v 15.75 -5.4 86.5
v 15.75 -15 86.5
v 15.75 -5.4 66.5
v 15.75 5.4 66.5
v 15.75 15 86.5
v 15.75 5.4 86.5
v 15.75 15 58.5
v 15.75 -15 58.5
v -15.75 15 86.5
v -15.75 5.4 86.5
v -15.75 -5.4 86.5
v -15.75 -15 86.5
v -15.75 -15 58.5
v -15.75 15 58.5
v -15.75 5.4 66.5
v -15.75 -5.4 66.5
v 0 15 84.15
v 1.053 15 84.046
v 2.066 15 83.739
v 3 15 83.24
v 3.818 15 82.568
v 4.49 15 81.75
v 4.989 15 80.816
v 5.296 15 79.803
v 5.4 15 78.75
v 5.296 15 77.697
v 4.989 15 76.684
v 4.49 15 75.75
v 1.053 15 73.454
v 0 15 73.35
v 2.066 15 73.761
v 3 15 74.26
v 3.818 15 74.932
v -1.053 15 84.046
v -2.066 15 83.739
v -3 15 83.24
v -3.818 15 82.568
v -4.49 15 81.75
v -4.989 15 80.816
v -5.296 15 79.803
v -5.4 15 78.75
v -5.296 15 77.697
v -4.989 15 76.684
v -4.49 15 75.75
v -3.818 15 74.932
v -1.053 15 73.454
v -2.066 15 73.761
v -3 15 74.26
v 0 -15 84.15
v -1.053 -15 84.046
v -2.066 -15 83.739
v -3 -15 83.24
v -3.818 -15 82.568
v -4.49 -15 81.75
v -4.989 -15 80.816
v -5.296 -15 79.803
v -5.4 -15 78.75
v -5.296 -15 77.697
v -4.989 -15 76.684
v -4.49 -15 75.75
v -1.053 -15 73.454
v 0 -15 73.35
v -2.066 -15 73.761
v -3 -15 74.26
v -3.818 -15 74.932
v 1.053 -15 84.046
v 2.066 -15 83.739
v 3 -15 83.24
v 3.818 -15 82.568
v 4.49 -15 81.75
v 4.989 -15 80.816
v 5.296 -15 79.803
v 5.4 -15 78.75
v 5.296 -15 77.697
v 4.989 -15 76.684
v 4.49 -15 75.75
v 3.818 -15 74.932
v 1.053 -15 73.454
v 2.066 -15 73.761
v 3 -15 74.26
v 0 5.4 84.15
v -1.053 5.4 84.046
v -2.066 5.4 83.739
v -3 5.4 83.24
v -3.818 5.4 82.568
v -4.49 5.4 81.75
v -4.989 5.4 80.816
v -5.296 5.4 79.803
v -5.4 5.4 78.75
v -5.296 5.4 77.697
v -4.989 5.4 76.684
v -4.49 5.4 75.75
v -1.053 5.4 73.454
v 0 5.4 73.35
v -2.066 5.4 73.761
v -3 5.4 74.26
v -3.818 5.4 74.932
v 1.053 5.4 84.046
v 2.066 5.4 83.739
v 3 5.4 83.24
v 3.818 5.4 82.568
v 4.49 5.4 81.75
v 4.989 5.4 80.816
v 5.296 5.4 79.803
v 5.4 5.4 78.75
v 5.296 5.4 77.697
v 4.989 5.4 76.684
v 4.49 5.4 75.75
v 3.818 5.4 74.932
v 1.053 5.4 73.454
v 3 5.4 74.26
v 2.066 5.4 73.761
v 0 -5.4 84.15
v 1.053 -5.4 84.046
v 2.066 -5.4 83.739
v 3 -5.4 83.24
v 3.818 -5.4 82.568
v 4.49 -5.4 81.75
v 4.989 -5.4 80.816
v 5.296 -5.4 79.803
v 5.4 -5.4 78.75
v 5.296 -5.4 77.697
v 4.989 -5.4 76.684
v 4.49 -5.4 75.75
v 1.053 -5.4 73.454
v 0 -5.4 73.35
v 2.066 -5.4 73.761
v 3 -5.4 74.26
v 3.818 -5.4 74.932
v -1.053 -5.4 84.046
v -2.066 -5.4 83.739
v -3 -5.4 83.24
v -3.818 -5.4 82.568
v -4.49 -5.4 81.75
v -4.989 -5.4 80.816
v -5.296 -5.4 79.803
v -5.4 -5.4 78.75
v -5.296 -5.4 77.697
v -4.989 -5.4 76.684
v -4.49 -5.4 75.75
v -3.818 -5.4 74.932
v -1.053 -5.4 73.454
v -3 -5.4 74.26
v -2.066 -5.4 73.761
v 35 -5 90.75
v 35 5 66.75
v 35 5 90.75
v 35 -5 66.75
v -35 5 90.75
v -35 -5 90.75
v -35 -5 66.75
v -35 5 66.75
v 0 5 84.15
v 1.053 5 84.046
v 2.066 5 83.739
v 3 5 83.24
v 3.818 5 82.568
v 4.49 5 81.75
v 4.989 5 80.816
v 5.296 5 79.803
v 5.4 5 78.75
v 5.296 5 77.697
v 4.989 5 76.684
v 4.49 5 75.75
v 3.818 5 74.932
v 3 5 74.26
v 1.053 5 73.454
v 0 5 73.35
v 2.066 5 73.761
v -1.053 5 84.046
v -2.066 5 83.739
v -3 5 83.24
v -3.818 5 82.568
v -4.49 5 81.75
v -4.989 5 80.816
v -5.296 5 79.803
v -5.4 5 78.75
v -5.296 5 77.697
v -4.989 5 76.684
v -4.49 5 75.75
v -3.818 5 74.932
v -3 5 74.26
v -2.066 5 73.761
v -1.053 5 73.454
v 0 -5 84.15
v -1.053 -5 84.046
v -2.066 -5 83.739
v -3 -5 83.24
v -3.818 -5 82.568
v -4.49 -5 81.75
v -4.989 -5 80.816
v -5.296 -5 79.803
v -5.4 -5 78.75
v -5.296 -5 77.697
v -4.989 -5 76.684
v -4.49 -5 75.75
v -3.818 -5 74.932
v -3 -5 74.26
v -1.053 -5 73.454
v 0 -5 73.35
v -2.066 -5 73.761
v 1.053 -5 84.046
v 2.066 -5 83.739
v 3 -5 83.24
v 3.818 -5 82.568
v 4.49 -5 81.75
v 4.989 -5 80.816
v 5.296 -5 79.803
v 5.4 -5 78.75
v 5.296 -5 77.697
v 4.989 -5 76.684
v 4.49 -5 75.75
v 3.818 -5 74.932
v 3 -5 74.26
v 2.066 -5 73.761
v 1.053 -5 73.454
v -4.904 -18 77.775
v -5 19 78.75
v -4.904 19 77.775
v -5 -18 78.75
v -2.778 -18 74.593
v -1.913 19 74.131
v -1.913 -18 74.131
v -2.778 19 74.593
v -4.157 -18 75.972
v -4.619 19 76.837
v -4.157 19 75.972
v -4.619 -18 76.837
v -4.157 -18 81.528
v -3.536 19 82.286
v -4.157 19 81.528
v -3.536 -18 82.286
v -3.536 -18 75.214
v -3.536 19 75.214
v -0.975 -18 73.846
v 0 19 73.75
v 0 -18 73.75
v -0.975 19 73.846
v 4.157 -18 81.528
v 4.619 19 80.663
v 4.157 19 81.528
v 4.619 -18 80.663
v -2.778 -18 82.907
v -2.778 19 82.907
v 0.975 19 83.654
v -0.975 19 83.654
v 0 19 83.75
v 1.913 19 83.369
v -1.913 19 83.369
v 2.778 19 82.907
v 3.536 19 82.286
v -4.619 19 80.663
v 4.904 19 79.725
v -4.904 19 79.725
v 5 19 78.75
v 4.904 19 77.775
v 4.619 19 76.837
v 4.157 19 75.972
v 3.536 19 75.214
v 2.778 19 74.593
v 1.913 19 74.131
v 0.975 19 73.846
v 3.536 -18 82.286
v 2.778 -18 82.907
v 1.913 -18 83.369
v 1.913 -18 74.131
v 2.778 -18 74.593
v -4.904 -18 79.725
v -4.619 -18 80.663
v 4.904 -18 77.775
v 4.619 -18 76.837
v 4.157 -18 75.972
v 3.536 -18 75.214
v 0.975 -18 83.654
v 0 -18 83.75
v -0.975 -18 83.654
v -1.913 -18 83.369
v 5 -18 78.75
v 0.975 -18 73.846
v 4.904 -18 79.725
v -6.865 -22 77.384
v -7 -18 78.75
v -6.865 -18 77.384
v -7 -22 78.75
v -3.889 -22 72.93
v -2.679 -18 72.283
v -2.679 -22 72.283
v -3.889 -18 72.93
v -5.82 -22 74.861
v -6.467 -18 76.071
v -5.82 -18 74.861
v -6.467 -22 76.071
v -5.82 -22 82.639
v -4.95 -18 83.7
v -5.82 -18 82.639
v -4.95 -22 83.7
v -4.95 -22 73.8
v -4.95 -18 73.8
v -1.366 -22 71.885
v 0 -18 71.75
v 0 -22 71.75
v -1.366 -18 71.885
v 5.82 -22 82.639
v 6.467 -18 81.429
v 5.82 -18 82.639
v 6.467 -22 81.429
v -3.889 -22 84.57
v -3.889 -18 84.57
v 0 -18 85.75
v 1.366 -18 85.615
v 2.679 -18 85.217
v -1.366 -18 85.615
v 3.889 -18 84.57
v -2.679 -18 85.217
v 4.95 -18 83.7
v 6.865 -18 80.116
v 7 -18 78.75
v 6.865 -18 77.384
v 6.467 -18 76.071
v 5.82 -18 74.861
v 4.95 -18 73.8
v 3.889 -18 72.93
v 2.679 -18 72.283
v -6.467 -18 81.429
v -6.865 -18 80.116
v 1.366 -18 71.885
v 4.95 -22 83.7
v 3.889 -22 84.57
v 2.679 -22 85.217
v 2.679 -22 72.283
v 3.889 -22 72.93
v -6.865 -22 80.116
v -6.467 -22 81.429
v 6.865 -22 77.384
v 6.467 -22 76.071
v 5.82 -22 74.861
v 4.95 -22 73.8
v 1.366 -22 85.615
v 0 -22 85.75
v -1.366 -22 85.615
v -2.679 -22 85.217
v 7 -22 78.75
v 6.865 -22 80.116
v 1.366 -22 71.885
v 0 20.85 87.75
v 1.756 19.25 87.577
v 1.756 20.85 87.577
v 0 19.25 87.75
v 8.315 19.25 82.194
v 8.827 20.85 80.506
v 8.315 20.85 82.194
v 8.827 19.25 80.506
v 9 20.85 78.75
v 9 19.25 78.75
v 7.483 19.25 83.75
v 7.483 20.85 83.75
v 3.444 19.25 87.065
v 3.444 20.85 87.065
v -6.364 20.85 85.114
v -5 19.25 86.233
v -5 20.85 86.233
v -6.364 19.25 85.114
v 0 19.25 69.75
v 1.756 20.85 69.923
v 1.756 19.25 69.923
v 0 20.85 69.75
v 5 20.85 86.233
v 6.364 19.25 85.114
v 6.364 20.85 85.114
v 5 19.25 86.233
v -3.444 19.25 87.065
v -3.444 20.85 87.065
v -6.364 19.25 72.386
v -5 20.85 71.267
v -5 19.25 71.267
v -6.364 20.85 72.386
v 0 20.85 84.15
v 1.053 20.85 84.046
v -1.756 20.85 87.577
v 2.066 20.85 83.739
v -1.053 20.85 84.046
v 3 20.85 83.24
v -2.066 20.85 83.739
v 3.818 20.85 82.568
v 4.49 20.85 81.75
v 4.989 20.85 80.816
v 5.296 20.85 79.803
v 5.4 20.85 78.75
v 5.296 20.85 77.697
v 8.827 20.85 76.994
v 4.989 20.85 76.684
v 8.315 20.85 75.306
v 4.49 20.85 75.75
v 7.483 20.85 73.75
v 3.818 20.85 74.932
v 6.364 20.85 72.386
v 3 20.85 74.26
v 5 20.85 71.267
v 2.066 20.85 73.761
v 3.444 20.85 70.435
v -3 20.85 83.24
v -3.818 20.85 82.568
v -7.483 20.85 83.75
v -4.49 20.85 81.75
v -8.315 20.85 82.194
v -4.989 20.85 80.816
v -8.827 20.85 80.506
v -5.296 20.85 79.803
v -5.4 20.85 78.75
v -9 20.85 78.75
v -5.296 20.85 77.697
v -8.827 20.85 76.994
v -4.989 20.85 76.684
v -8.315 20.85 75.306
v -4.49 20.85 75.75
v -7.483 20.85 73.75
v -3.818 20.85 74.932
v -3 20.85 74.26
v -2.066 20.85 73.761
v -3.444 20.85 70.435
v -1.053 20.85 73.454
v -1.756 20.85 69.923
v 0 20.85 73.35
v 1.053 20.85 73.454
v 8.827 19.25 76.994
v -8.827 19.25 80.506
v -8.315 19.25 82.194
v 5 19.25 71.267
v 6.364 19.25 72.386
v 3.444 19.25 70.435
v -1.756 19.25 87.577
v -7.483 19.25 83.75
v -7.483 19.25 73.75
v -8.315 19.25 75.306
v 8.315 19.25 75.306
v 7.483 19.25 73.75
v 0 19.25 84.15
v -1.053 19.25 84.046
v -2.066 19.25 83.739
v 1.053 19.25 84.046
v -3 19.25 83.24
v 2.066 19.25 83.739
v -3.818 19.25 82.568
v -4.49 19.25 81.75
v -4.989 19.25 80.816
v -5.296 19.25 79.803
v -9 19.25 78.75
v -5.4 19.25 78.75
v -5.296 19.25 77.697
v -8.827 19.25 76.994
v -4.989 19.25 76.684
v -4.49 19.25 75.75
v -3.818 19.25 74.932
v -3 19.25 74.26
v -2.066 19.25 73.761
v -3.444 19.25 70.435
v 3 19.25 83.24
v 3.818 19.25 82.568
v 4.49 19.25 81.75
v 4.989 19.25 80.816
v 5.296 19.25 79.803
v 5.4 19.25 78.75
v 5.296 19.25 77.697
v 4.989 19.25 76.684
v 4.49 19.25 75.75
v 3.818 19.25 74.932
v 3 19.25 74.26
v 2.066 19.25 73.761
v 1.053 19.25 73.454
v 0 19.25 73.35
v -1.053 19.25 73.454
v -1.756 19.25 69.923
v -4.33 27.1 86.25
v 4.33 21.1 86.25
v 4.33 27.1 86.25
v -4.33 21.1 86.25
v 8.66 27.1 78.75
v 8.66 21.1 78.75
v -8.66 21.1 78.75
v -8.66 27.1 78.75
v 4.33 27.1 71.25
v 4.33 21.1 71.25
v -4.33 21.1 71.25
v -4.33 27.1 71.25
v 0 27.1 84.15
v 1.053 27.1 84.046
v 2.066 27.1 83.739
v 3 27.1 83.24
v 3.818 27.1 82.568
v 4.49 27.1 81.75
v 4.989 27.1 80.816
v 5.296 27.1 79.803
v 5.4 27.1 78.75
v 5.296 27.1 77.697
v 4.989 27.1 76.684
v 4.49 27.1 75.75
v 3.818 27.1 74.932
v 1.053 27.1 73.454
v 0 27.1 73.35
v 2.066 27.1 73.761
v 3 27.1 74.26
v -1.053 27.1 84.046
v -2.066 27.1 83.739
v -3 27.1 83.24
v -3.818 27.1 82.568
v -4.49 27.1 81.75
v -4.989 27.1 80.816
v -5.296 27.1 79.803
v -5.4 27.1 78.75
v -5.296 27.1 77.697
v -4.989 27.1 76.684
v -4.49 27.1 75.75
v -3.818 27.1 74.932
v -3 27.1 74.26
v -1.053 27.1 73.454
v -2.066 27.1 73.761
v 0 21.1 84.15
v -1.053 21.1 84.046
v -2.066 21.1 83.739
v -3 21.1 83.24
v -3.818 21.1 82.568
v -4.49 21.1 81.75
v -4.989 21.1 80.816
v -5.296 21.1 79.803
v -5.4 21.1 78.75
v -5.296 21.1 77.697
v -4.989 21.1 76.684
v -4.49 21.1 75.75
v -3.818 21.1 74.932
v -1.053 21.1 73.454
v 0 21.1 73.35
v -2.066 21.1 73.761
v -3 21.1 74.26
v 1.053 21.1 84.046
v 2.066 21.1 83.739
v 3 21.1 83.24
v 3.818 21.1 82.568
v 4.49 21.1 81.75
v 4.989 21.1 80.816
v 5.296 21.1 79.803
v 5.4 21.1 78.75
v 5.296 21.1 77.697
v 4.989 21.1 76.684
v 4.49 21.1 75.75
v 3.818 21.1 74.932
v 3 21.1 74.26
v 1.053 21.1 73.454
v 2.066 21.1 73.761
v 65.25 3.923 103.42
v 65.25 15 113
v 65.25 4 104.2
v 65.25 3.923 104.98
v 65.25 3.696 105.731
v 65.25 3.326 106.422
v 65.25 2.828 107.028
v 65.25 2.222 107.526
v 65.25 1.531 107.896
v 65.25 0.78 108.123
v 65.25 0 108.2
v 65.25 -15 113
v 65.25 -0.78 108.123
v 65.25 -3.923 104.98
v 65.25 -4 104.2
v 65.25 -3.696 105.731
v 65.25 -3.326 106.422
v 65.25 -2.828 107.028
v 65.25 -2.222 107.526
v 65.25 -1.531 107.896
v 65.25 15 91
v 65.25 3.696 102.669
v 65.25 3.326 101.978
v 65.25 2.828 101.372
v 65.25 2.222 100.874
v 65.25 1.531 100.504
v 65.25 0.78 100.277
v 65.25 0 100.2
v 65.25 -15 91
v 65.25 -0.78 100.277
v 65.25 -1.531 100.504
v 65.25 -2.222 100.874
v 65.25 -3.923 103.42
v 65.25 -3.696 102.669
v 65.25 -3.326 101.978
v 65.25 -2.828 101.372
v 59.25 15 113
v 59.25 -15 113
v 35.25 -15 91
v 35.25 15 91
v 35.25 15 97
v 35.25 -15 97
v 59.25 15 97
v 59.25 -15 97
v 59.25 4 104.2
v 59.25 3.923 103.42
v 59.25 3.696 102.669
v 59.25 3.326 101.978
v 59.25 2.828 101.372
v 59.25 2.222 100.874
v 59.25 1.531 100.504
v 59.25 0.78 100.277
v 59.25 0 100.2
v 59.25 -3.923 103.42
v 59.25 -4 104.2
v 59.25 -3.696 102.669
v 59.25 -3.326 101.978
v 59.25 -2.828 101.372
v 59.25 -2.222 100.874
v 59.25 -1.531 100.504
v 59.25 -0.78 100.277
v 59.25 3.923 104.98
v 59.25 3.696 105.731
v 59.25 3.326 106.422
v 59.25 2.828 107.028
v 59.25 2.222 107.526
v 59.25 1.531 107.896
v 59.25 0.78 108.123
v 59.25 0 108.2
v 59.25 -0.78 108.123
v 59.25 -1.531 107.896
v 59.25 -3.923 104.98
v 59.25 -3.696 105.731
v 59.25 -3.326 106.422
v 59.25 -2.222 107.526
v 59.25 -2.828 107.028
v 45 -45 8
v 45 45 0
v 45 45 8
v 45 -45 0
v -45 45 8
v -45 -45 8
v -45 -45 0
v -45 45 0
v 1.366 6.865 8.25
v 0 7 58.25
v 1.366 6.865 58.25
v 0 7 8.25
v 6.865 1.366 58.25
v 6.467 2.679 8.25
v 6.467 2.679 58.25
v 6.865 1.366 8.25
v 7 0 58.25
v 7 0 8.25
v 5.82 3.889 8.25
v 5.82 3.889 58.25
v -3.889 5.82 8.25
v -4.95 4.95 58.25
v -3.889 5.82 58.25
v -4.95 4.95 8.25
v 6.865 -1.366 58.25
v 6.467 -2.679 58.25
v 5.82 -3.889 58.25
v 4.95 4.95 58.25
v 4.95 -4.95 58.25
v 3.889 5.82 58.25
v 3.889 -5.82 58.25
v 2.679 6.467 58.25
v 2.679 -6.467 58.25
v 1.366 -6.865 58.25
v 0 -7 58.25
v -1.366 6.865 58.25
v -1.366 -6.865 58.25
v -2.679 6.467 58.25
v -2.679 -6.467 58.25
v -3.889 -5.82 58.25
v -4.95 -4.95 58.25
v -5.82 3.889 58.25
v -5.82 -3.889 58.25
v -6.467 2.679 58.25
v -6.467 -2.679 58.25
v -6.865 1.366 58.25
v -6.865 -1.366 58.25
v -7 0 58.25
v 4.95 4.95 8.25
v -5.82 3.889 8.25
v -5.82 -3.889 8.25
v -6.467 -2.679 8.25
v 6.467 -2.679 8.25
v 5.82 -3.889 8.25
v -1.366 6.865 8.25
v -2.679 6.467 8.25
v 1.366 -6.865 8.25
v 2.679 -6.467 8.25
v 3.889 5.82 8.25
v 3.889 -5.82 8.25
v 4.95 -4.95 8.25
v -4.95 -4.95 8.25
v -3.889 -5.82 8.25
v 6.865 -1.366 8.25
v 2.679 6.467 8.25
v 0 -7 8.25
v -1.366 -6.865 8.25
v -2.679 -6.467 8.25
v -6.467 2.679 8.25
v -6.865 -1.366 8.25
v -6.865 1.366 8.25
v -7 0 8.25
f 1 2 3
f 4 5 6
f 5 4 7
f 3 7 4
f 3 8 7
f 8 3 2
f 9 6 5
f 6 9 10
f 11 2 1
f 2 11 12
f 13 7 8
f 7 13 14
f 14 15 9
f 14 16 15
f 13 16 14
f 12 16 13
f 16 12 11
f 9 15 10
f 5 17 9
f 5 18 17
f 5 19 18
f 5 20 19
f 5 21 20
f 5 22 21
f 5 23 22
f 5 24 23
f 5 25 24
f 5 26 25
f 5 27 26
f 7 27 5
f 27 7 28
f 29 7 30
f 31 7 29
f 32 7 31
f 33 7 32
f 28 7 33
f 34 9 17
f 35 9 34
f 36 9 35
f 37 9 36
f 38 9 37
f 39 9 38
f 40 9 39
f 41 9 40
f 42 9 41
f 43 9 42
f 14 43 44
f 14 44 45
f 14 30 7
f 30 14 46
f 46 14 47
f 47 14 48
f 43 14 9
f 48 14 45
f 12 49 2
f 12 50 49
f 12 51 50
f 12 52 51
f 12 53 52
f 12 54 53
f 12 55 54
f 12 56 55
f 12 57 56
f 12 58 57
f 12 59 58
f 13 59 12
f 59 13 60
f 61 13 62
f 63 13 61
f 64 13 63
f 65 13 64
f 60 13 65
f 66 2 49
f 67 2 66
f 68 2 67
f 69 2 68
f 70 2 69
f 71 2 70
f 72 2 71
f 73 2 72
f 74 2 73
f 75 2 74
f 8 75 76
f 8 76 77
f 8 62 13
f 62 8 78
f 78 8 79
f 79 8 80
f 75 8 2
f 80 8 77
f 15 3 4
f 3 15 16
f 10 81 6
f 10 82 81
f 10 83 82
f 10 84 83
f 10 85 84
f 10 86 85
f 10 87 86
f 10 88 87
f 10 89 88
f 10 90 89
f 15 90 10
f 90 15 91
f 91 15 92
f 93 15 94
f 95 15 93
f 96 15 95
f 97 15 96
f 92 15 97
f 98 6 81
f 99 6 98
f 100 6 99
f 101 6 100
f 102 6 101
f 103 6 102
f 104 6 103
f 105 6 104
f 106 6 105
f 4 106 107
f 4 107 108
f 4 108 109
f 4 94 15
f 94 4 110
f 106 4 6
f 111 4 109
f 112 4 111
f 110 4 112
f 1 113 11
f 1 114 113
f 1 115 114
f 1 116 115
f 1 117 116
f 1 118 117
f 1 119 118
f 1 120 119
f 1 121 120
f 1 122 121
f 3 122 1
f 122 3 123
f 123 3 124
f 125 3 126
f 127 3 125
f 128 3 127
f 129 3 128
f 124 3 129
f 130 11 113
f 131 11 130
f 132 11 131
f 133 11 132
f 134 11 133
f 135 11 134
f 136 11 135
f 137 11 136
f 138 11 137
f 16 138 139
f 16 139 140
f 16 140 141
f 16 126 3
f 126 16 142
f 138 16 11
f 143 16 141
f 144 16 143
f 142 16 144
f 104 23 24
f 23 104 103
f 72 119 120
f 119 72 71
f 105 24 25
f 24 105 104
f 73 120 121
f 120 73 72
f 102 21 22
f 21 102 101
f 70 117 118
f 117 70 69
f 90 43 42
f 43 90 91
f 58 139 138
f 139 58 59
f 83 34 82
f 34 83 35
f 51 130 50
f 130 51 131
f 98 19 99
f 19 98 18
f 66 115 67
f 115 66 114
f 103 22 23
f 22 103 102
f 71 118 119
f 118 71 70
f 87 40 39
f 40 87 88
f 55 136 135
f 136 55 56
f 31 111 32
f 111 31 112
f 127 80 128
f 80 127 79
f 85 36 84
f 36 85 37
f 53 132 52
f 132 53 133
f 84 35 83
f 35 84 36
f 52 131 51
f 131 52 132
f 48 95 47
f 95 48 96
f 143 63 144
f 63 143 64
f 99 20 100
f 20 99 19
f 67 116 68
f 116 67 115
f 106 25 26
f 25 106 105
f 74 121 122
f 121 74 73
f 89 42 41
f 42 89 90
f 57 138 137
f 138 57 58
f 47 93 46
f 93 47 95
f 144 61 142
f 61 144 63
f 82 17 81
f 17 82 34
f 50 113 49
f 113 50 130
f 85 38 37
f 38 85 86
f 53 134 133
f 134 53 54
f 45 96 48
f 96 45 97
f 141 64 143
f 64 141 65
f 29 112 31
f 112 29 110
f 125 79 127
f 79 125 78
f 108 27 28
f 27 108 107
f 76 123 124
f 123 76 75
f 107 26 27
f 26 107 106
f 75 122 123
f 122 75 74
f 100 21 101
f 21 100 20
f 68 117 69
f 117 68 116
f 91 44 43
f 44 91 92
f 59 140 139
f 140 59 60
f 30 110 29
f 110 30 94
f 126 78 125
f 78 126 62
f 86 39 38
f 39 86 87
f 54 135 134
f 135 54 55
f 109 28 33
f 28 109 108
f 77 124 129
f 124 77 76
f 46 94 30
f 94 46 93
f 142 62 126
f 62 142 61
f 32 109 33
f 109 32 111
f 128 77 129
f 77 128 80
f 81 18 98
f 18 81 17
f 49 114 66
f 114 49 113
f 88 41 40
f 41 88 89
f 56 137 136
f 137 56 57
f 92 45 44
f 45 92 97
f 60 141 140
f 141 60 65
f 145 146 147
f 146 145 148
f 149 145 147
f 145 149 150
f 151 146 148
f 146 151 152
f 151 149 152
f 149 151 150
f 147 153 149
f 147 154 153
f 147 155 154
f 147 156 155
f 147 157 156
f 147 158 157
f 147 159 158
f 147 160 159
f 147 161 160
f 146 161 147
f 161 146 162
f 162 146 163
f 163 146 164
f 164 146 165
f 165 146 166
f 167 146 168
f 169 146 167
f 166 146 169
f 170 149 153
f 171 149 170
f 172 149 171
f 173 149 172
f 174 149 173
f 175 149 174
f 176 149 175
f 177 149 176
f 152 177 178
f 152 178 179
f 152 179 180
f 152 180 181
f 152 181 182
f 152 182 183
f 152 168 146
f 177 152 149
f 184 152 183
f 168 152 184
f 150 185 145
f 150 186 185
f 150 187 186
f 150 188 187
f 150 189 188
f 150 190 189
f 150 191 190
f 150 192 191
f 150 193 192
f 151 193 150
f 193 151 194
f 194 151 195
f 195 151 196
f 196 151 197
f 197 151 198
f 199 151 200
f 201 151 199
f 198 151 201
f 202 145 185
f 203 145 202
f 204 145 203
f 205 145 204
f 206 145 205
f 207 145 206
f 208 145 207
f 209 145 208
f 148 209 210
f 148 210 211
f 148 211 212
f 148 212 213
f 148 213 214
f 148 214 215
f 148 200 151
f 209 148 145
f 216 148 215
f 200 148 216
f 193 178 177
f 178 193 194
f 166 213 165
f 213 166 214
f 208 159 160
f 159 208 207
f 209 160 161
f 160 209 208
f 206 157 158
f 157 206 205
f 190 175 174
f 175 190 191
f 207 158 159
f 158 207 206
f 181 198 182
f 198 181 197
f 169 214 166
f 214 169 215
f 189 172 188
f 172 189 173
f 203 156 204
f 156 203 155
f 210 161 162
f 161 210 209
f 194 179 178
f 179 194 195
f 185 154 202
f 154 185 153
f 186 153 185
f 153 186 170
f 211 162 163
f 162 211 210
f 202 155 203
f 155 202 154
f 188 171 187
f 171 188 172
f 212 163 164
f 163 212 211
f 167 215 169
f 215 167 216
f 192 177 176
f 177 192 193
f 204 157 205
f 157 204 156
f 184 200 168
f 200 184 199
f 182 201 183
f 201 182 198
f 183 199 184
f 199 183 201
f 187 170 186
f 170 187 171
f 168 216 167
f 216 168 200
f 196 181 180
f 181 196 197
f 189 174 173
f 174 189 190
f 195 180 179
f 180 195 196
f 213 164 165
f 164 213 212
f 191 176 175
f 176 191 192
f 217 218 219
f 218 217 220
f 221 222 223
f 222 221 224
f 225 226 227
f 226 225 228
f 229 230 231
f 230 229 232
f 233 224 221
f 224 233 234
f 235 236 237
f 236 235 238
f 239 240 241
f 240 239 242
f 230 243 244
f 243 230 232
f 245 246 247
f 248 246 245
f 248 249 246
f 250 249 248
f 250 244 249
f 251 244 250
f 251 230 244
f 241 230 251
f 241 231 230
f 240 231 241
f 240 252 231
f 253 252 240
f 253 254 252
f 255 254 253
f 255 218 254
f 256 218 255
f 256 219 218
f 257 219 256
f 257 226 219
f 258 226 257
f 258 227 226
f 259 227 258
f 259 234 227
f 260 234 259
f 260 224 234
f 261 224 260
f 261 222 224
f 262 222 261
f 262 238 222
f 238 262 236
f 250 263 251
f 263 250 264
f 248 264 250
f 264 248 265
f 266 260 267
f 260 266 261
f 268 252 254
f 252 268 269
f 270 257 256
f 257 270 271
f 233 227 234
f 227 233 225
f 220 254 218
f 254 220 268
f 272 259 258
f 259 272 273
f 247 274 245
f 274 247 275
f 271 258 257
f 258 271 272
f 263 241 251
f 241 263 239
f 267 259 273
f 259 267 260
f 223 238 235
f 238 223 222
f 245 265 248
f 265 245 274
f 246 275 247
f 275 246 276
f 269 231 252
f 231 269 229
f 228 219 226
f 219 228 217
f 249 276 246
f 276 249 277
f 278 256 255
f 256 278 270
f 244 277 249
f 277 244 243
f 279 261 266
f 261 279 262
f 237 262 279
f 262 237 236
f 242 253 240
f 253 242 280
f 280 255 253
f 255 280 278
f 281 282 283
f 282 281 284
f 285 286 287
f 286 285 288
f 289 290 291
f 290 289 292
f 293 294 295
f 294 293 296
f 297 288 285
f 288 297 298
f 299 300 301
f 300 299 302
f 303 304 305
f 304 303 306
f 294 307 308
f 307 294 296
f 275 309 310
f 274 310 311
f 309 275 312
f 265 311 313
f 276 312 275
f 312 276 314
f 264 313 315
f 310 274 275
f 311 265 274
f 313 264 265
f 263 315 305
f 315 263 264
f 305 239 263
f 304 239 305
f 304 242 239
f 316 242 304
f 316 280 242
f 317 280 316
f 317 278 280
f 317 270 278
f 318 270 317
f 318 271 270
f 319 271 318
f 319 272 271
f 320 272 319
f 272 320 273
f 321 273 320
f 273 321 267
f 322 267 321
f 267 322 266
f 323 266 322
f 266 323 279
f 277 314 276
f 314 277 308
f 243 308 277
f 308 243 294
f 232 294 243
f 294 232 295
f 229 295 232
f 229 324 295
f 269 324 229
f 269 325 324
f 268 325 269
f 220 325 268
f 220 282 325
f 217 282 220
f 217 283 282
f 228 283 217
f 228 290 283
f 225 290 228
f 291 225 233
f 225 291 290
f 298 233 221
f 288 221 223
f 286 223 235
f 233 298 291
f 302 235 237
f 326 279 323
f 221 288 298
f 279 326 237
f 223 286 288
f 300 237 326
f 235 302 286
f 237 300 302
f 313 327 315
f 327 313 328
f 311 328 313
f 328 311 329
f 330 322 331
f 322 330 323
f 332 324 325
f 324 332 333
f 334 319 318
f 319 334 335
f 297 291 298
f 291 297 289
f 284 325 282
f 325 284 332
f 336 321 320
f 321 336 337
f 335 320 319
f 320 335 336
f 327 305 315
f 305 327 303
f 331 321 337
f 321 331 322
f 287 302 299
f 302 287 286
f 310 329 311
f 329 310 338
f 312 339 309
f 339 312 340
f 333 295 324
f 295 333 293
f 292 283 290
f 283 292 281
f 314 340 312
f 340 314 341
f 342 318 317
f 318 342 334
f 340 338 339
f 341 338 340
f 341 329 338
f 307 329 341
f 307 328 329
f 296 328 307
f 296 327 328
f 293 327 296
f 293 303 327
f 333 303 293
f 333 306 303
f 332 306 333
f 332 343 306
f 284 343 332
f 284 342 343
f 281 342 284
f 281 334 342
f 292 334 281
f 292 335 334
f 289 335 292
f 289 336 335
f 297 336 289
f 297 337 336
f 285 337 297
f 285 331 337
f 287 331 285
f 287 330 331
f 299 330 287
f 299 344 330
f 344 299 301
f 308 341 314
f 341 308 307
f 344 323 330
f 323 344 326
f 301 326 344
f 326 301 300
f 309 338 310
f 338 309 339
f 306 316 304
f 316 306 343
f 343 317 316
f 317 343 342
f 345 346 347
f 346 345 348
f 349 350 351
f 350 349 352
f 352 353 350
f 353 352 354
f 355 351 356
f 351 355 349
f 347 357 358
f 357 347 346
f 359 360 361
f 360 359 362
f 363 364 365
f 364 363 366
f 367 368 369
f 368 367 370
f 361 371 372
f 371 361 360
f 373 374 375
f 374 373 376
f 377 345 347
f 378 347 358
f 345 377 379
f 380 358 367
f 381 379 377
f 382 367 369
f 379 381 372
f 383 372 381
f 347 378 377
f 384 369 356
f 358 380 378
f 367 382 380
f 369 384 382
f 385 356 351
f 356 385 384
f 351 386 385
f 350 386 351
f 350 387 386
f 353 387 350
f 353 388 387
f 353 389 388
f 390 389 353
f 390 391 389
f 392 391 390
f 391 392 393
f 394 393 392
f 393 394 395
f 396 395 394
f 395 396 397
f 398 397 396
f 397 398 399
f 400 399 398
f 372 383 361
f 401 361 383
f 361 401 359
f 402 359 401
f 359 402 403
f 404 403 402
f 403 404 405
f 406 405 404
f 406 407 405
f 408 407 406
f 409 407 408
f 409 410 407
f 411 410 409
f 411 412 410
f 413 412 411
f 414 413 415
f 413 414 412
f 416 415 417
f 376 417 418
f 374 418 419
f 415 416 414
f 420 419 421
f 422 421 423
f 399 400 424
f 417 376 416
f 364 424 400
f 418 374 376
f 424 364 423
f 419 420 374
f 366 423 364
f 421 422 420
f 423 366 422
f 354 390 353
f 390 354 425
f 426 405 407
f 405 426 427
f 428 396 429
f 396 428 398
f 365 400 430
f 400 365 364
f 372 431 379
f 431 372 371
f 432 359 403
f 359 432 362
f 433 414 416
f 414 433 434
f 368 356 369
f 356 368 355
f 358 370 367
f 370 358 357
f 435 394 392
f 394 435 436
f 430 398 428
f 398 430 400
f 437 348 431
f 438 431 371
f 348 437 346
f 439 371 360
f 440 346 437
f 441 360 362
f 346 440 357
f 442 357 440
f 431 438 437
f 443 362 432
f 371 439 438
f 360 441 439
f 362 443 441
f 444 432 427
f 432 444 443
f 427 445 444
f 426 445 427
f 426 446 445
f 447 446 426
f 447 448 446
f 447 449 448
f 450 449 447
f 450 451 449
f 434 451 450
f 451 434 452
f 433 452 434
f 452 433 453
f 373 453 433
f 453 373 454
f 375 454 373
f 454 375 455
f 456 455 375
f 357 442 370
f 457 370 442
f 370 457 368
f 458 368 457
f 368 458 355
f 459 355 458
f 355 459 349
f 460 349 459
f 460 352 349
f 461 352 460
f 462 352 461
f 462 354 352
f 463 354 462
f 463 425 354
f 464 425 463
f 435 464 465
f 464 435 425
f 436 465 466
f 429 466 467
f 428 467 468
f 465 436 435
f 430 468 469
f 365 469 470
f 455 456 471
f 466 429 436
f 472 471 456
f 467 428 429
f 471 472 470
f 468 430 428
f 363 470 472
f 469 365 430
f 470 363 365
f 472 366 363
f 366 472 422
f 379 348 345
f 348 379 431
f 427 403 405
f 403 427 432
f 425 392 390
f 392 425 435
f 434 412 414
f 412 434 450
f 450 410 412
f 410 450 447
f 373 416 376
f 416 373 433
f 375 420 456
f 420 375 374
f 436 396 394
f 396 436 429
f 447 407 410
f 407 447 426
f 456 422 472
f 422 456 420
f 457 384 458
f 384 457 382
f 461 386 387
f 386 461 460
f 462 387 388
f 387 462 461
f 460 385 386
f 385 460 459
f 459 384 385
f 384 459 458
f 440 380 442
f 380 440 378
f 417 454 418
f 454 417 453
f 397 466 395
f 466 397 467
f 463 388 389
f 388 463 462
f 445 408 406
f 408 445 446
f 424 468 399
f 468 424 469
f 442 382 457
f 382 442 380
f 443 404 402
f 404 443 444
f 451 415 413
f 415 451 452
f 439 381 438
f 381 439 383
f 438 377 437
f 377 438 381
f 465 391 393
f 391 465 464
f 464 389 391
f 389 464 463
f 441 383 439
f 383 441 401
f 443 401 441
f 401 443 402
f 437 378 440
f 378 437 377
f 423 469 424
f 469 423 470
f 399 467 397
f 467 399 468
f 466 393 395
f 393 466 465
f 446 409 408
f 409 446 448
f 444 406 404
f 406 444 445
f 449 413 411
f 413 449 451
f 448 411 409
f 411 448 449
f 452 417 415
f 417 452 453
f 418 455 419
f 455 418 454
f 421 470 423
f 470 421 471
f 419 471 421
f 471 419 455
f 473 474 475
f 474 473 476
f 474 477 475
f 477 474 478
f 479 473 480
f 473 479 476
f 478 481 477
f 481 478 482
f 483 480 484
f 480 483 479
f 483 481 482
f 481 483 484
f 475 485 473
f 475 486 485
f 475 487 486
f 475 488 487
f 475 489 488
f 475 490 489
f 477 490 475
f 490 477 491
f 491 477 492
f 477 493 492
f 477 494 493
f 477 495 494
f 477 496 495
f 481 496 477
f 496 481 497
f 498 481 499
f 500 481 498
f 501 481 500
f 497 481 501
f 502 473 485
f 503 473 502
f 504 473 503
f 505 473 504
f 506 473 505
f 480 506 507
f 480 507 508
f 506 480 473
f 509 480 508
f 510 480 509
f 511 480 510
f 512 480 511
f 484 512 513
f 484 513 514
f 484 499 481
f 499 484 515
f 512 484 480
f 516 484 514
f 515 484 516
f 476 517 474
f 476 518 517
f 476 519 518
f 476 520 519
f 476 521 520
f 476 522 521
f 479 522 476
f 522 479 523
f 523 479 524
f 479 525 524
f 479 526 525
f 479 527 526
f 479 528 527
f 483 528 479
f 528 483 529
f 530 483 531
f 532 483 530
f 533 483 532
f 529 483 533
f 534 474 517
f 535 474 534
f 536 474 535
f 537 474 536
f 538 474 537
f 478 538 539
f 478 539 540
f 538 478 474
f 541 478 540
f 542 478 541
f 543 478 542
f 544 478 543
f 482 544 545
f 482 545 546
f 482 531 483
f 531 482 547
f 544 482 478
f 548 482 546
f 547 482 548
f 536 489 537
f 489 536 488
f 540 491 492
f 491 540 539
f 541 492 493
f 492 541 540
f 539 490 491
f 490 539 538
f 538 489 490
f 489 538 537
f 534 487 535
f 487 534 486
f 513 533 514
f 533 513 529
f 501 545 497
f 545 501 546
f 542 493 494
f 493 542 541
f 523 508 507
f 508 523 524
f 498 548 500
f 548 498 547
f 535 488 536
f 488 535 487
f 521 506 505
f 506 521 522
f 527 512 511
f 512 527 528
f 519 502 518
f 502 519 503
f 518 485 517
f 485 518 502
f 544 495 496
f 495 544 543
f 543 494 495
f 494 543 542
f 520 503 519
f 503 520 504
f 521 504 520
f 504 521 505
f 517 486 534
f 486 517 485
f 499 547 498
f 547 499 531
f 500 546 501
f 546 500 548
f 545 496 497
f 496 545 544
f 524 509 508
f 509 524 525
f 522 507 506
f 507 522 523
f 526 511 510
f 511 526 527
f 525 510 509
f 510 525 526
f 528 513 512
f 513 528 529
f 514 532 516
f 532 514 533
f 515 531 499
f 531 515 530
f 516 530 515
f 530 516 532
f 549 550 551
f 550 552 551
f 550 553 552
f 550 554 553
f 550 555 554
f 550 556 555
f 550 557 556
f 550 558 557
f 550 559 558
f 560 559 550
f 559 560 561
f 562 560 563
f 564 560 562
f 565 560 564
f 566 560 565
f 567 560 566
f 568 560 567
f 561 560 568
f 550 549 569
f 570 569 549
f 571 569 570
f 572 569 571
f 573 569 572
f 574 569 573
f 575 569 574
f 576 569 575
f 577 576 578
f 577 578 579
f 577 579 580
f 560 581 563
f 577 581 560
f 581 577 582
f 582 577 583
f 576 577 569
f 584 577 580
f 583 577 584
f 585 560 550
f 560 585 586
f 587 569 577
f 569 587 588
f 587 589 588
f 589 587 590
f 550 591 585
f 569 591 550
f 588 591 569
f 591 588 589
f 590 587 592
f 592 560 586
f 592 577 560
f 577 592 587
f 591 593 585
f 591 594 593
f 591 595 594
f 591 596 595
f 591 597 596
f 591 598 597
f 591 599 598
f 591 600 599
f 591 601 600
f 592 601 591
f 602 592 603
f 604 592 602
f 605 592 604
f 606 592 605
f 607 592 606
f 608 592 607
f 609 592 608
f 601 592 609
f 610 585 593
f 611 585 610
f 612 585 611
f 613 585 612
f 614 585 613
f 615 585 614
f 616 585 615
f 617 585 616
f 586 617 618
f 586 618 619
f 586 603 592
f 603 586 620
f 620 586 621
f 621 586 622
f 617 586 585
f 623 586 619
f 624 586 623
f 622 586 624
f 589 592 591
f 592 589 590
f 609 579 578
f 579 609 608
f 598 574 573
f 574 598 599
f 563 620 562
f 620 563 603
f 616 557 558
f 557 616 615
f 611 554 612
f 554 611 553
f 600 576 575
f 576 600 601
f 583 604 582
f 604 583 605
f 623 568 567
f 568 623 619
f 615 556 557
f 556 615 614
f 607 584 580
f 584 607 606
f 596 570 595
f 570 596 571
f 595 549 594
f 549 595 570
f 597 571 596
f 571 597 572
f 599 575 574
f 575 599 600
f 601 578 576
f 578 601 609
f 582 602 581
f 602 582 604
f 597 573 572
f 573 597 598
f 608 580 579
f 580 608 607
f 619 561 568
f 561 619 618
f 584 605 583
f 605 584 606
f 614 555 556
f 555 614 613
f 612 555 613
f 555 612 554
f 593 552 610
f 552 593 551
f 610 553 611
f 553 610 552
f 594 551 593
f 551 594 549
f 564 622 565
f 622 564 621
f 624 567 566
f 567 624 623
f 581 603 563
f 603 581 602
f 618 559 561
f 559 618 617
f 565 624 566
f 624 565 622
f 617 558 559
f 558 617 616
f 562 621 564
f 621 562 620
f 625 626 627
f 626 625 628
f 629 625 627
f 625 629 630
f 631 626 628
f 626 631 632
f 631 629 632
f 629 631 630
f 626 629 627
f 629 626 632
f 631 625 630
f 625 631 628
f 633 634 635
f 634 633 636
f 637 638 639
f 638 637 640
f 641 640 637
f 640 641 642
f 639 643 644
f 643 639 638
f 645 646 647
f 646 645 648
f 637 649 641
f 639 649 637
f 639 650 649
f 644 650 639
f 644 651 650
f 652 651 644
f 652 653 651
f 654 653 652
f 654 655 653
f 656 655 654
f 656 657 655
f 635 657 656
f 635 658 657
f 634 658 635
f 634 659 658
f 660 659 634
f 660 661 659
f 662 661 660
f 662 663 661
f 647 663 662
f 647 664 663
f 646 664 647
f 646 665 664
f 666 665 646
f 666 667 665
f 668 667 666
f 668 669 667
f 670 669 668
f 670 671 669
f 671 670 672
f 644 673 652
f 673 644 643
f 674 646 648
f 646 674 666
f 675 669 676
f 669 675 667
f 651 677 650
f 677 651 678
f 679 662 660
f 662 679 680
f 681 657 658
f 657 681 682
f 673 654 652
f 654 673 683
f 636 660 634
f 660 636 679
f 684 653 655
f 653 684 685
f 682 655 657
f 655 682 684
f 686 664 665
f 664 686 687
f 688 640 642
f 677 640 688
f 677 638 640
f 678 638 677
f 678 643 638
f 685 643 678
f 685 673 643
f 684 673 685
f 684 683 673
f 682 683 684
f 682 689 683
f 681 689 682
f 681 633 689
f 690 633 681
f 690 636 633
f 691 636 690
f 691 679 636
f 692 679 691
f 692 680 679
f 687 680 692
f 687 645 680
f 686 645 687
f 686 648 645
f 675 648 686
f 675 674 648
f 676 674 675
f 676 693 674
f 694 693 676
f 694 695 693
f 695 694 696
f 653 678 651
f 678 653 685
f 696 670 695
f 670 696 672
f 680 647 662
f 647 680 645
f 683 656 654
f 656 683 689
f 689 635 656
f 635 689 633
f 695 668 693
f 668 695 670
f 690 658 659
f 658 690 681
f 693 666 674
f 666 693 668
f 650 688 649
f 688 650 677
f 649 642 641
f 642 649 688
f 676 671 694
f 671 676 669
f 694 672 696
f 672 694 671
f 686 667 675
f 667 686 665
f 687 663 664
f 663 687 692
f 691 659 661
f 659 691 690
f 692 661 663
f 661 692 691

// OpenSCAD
$fn = 32;

// ------------------------------------------------------------------------
// Lamp arm: column d14 x 50 mm, arm 70 mm
// Every part is its own module, assembly() places every instance.
// ------------------------------------------------------------------------

// --- part 1 ---
module lamp_base() {
  difference() {
    translate([-45, -45, 0]) cube([90, 90, 8]);
  }
}

// --- part 2 ---
module lamp_column() {
  cylinder(h = 50, d = 14);
}

// --- part 3 ---
module head_fork() {
  difference() {
    translate([-15.75, -15, 0]) cube([31.5, 30, 28]);
    translate([-16.75, -5.4, 8]) cube([33.5, 10.8, 21]);
    translate([0, 0, 20.25]) rotate([90, 0, 0]) cylinder(h = 32, d = 10.8, center = true);
  }
}

// --- part 4 ---
module lamp_arm() {
  difference() {
    translate([-35, -5, 0]) cube([70, 10, 24]);
    translate([0, 0, 12]) rotate([90, 0, 0]) cylinder(h = 12, d = 10.8, center = true);
  }
}

// --- part 5 ---
module arm_pin() {
  rotate([0, 90, 0]) cylinder(h = 38, d = 10, center = true);
  translate([-22, 0, 0]) rotate([0, 90, 0]) cylinder(h = 4, d = 14);
}

// --- part 6 ---
module arm_washer() {
  difference() {
      translate([0, 0, 0]) cylinder(h = 1.6, d = 18);
      translate([0, 0, -1]) cylinder(h = 3.6, d = 10.8);
    }
}

// --- part 7 ---
module arm_nut() {
  difference() {
    linear_extrude(height = 6) polygon(points = [[8.66, 0], [4.33, 7.5], [-4.33, 7.5], [-8.66, 0], [-4.33, -7.5], [4.33, -7.5]]);
    translate([0, 0, -1]) cylinder(h = 8, d = 10.8);
  }
}

// --- part 8 ---
module shade_bracket() {
  difference() {
    translate([-15, -15, 0]) cube([30, 30, 22]);
    translate([-16, -16, 6]) cube([25, 32, 17]);
    translate([12, 0, 13.2]) rotate([0, 90, 0]) cylinder(h = 8, d = 8, center = true);
  }
}

// --- assembly ---
module assembly() {
  color([0.80, 0.24, 0.20]) translate([0, 0, 0]) rotate([0, 0, 0]) lamp_base();
  color([0.20, 0.45, 0.75]) translate([0, 0, 8.25]) rotate([0, 0, 0]) lamp_column();
  color([0.25, 0.62, 0.32]) translate([0, 0, 58.5]) rotate([0, 0, 0]) head_fork();
  color([0.92, 0.70, 0.18]) translate([0, 0, 66.75]) rotate([0, 0, 0]) lamp_arm();
  color([0.58, 0.35, 0.70]) translate([0, 0, 78.75]) rotate([0, 0, 90]) arm_pin();
  color([0.16, 0.66, 0.66]) translate([0, 20.85, 78.75]) rotate([90, 0, 0]) arm_washer();
  color([0.85, 0.48, 0.18]) translate([0, 27.1, 78.75]) rotate([90, 0, 0]) arm_nut();
  color([0.55, 0.60, 0.65]) translate([50.25, 0, 91]) rotate([0, 0, 0]) shade_bracket();
}

assembly();
